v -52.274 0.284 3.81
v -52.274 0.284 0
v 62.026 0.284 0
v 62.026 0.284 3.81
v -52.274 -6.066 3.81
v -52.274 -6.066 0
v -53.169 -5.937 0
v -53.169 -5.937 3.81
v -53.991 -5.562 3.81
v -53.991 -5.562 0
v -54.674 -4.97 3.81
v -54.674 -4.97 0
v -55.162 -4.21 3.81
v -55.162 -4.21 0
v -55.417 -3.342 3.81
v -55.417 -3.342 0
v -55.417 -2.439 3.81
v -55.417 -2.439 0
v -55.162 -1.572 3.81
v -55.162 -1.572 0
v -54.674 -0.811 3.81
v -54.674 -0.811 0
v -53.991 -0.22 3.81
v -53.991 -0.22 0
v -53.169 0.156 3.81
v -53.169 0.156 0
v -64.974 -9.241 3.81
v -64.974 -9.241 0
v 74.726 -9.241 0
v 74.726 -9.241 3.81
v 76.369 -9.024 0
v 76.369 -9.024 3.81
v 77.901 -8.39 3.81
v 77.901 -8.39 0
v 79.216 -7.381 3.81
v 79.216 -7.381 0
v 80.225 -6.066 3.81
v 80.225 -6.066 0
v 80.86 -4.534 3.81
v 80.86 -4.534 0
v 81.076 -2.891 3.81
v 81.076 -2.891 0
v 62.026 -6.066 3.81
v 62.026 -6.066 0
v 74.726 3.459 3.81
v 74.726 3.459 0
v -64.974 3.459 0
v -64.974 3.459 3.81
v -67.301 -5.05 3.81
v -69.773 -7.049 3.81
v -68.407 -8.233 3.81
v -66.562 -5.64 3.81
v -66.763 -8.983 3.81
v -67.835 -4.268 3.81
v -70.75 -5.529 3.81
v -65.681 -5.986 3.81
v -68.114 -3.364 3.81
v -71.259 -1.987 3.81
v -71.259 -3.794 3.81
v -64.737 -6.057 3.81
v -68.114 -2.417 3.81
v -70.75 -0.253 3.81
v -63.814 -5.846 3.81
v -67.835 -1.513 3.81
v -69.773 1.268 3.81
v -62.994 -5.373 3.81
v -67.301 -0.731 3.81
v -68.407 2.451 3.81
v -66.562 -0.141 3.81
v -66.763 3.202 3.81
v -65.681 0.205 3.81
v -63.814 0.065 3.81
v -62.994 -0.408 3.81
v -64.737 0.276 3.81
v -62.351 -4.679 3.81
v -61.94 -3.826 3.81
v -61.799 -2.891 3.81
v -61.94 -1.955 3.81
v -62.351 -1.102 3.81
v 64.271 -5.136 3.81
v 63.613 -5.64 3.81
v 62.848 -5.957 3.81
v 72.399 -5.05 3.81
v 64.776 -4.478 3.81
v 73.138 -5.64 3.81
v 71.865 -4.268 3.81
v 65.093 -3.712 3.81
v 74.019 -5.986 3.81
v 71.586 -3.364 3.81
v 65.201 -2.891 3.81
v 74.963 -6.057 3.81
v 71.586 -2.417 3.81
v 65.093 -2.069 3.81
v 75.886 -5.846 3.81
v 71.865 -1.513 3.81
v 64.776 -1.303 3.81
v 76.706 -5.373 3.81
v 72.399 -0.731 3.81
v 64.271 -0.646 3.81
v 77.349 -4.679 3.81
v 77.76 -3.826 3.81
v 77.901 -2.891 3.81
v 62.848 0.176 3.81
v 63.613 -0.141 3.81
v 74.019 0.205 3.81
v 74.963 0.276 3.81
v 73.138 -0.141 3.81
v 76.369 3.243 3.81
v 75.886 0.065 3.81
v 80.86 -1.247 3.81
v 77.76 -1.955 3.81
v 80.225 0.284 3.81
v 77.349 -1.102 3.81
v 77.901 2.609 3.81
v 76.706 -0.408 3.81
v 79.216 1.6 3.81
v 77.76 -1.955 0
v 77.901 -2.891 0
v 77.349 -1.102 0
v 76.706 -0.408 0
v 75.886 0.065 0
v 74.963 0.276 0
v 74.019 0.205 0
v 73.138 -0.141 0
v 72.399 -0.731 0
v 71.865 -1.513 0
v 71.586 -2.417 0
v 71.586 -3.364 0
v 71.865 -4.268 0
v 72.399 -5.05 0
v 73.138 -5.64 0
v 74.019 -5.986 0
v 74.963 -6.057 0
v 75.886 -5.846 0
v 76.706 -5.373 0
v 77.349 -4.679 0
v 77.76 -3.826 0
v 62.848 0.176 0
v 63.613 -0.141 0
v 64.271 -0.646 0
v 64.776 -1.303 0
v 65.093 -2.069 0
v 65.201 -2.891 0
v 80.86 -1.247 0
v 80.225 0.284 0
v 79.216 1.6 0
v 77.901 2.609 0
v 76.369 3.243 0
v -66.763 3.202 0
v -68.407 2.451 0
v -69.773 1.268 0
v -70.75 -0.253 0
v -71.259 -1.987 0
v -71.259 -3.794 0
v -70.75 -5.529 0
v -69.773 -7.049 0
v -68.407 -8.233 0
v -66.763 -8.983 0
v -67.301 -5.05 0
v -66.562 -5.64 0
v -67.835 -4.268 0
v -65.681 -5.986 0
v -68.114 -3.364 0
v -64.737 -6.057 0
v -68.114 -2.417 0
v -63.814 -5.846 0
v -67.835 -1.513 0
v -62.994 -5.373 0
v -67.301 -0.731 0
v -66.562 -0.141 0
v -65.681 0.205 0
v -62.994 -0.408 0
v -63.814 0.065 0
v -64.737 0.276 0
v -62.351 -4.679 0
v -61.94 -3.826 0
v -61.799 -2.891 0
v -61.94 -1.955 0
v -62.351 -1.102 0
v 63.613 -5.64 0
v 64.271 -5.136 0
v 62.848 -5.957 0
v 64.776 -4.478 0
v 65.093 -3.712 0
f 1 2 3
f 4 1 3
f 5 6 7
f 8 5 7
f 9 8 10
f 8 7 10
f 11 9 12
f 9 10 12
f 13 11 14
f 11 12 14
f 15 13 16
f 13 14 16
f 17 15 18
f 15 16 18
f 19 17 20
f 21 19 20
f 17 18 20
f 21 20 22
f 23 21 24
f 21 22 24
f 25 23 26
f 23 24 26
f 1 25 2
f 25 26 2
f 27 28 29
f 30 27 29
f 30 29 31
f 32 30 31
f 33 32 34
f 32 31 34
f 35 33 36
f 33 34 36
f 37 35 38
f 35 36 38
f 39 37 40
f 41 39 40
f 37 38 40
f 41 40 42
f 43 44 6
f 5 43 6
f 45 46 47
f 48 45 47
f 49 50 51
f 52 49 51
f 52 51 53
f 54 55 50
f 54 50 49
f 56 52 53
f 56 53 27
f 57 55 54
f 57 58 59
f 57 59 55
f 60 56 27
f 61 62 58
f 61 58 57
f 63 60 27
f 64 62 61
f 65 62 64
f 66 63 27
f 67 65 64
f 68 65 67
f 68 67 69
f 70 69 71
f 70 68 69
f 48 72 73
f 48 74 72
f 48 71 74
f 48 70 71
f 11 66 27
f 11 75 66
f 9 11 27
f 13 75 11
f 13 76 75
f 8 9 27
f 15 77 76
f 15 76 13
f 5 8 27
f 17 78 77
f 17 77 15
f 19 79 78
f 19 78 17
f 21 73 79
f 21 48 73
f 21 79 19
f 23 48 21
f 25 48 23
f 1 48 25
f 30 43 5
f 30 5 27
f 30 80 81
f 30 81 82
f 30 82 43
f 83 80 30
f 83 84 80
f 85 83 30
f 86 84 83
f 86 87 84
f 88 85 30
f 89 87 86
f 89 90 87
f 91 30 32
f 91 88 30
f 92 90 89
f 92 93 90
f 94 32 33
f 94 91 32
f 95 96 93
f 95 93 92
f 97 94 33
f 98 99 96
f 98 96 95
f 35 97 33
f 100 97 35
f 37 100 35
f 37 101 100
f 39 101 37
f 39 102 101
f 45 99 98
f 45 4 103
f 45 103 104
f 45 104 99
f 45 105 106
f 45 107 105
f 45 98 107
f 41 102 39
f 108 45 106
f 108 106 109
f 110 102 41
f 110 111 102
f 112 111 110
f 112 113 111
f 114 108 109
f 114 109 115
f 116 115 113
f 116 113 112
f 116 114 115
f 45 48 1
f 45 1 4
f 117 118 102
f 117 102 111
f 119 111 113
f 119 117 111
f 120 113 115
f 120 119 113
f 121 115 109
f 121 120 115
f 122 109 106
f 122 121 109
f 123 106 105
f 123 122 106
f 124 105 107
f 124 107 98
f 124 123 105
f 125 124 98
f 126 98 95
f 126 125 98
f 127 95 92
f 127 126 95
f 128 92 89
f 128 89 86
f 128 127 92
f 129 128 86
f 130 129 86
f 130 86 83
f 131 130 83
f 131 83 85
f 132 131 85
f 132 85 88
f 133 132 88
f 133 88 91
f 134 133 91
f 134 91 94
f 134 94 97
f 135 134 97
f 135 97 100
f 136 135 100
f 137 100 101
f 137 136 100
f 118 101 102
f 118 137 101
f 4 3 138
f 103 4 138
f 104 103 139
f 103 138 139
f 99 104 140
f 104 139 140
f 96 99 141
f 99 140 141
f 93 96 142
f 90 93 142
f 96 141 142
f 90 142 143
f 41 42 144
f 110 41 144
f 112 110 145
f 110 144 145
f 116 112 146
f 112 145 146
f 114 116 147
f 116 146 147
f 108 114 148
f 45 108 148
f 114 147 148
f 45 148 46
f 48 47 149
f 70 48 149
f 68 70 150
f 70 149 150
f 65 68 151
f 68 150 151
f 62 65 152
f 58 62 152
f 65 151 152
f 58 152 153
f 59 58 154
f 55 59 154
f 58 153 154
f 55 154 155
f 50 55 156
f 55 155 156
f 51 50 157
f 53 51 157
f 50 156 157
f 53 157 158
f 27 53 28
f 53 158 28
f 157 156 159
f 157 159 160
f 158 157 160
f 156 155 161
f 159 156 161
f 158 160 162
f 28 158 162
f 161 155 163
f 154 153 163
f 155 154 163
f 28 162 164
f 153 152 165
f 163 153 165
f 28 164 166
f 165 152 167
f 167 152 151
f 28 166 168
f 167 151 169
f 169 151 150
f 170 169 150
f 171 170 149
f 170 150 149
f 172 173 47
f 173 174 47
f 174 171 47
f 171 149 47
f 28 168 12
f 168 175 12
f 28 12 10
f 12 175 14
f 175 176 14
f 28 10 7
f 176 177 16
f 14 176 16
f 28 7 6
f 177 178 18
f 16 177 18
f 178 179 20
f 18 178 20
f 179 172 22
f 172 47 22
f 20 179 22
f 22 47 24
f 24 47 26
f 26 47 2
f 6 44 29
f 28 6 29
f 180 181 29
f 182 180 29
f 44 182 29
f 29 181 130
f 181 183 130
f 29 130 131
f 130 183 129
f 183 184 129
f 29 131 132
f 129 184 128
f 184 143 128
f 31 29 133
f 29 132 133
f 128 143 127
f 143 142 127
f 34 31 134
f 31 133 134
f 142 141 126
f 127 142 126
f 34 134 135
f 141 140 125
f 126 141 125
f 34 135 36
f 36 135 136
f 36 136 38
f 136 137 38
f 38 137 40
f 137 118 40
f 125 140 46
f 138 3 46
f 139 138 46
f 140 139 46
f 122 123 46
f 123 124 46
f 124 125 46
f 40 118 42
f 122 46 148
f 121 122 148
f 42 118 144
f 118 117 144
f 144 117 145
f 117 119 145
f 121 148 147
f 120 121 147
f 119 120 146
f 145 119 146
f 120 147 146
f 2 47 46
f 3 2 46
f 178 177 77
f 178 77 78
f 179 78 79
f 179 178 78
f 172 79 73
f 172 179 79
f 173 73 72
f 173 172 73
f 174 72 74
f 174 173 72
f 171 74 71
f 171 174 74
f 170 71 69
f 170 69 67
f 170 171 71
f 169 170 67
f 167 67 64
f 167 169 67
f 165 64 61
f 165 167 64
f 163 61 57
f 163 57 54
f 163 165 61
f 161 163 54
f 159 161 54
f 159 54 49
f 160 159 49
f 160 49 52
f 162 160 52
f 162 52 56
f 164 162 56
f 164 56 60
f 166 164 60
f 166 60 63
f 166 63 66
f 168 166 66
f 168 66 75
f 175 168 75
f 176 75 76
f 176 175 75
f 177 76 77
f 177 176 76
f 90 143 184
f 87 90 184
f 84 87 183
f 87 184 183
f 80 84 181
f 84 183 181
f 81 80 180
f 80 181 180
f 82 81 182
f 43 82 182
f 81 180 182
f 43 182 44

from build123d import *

# Parameters (mm, degrees)
F0_R     = 3.175
F1_DEPTH = 3.81


with BuildPart() as f1:
    # F0 (on Top) → F1 (new body)
    with BuildSketch(Plane.XY):
        with BuildLine():
            Line((74.725954, 3.459382), (-64.974046, 3.459382))
            ThreePointArc((-64.974046, 3.459382), (-60.483918, 1.59951), (-58.624046, -2.890618))
            ThreePointArc((-58.624046, -2.890618), (-60.483918, -7.380746), (-64.974046, -9.240618))
            Line((-64.974046, -9.240618), (74.725954, -9.240618))
            ThreePointArc((74.725954, -9.240618), (68.375954, -2.890618), (74.725954, 3.459382))
        make_face()
        with BuildLine():
            ThreePointArc((-52.274046, -6.065618), (-55.449046, -2.890618), (-52.274046, 0.284382))
            Line((-52.274046, 0.284382), (62.025954, 0.284382))
            ThreePointArc((62.025954, 0.284382), (64.271018, -0.645554), (65.200954, -2.890618))
            ThreePointArc((65.200954, -2.890618), (64.271018, -5.135682), (62.025954, -6.065618))
            Line((62.025954, -6.065618), (-52.274046, -6.065618))
        make_face(mode=Mode.SUBTRACT)
        with BuildLine():
            ThreePointArc((81.075954, -2.890618), (79.216082, 1.59951), (74.725954, 3.459382))
            ThreePointArc((74.725954, 3.459382), (68.375954, -2.890618), (74.725954, -9.240618))
            ThreePointArc((74.725954, -9.240618), (79.216082, -7.380746), (81.075954, -2.890618))
        make_face()
        with Locations((74.725954, -2.890618)):
            Circle(F0_R, mode=Mode.SUBTRACT)
        with BuildLine():
            ThreePointArc((-58.624046, -2.890618), (-60.483918, 1.59951), (-64.974046, 3.459382))
            ThreePointArc((-64.974046, 3.459382), (-71.324046, -2.890618), (-64.974046, -9.240618))
            ThreePointArc((-64.974046, -9.240618), (-60.483918, -7.380746), (-58.624046, -2.890618))
        make_face()
        with Locations((-64.974046, -2.890618)):
            Circle(F0_R, mode=Mode.SUBTRACT)
    extrude(amount=F1_DEPTH)


solid = f1.part
